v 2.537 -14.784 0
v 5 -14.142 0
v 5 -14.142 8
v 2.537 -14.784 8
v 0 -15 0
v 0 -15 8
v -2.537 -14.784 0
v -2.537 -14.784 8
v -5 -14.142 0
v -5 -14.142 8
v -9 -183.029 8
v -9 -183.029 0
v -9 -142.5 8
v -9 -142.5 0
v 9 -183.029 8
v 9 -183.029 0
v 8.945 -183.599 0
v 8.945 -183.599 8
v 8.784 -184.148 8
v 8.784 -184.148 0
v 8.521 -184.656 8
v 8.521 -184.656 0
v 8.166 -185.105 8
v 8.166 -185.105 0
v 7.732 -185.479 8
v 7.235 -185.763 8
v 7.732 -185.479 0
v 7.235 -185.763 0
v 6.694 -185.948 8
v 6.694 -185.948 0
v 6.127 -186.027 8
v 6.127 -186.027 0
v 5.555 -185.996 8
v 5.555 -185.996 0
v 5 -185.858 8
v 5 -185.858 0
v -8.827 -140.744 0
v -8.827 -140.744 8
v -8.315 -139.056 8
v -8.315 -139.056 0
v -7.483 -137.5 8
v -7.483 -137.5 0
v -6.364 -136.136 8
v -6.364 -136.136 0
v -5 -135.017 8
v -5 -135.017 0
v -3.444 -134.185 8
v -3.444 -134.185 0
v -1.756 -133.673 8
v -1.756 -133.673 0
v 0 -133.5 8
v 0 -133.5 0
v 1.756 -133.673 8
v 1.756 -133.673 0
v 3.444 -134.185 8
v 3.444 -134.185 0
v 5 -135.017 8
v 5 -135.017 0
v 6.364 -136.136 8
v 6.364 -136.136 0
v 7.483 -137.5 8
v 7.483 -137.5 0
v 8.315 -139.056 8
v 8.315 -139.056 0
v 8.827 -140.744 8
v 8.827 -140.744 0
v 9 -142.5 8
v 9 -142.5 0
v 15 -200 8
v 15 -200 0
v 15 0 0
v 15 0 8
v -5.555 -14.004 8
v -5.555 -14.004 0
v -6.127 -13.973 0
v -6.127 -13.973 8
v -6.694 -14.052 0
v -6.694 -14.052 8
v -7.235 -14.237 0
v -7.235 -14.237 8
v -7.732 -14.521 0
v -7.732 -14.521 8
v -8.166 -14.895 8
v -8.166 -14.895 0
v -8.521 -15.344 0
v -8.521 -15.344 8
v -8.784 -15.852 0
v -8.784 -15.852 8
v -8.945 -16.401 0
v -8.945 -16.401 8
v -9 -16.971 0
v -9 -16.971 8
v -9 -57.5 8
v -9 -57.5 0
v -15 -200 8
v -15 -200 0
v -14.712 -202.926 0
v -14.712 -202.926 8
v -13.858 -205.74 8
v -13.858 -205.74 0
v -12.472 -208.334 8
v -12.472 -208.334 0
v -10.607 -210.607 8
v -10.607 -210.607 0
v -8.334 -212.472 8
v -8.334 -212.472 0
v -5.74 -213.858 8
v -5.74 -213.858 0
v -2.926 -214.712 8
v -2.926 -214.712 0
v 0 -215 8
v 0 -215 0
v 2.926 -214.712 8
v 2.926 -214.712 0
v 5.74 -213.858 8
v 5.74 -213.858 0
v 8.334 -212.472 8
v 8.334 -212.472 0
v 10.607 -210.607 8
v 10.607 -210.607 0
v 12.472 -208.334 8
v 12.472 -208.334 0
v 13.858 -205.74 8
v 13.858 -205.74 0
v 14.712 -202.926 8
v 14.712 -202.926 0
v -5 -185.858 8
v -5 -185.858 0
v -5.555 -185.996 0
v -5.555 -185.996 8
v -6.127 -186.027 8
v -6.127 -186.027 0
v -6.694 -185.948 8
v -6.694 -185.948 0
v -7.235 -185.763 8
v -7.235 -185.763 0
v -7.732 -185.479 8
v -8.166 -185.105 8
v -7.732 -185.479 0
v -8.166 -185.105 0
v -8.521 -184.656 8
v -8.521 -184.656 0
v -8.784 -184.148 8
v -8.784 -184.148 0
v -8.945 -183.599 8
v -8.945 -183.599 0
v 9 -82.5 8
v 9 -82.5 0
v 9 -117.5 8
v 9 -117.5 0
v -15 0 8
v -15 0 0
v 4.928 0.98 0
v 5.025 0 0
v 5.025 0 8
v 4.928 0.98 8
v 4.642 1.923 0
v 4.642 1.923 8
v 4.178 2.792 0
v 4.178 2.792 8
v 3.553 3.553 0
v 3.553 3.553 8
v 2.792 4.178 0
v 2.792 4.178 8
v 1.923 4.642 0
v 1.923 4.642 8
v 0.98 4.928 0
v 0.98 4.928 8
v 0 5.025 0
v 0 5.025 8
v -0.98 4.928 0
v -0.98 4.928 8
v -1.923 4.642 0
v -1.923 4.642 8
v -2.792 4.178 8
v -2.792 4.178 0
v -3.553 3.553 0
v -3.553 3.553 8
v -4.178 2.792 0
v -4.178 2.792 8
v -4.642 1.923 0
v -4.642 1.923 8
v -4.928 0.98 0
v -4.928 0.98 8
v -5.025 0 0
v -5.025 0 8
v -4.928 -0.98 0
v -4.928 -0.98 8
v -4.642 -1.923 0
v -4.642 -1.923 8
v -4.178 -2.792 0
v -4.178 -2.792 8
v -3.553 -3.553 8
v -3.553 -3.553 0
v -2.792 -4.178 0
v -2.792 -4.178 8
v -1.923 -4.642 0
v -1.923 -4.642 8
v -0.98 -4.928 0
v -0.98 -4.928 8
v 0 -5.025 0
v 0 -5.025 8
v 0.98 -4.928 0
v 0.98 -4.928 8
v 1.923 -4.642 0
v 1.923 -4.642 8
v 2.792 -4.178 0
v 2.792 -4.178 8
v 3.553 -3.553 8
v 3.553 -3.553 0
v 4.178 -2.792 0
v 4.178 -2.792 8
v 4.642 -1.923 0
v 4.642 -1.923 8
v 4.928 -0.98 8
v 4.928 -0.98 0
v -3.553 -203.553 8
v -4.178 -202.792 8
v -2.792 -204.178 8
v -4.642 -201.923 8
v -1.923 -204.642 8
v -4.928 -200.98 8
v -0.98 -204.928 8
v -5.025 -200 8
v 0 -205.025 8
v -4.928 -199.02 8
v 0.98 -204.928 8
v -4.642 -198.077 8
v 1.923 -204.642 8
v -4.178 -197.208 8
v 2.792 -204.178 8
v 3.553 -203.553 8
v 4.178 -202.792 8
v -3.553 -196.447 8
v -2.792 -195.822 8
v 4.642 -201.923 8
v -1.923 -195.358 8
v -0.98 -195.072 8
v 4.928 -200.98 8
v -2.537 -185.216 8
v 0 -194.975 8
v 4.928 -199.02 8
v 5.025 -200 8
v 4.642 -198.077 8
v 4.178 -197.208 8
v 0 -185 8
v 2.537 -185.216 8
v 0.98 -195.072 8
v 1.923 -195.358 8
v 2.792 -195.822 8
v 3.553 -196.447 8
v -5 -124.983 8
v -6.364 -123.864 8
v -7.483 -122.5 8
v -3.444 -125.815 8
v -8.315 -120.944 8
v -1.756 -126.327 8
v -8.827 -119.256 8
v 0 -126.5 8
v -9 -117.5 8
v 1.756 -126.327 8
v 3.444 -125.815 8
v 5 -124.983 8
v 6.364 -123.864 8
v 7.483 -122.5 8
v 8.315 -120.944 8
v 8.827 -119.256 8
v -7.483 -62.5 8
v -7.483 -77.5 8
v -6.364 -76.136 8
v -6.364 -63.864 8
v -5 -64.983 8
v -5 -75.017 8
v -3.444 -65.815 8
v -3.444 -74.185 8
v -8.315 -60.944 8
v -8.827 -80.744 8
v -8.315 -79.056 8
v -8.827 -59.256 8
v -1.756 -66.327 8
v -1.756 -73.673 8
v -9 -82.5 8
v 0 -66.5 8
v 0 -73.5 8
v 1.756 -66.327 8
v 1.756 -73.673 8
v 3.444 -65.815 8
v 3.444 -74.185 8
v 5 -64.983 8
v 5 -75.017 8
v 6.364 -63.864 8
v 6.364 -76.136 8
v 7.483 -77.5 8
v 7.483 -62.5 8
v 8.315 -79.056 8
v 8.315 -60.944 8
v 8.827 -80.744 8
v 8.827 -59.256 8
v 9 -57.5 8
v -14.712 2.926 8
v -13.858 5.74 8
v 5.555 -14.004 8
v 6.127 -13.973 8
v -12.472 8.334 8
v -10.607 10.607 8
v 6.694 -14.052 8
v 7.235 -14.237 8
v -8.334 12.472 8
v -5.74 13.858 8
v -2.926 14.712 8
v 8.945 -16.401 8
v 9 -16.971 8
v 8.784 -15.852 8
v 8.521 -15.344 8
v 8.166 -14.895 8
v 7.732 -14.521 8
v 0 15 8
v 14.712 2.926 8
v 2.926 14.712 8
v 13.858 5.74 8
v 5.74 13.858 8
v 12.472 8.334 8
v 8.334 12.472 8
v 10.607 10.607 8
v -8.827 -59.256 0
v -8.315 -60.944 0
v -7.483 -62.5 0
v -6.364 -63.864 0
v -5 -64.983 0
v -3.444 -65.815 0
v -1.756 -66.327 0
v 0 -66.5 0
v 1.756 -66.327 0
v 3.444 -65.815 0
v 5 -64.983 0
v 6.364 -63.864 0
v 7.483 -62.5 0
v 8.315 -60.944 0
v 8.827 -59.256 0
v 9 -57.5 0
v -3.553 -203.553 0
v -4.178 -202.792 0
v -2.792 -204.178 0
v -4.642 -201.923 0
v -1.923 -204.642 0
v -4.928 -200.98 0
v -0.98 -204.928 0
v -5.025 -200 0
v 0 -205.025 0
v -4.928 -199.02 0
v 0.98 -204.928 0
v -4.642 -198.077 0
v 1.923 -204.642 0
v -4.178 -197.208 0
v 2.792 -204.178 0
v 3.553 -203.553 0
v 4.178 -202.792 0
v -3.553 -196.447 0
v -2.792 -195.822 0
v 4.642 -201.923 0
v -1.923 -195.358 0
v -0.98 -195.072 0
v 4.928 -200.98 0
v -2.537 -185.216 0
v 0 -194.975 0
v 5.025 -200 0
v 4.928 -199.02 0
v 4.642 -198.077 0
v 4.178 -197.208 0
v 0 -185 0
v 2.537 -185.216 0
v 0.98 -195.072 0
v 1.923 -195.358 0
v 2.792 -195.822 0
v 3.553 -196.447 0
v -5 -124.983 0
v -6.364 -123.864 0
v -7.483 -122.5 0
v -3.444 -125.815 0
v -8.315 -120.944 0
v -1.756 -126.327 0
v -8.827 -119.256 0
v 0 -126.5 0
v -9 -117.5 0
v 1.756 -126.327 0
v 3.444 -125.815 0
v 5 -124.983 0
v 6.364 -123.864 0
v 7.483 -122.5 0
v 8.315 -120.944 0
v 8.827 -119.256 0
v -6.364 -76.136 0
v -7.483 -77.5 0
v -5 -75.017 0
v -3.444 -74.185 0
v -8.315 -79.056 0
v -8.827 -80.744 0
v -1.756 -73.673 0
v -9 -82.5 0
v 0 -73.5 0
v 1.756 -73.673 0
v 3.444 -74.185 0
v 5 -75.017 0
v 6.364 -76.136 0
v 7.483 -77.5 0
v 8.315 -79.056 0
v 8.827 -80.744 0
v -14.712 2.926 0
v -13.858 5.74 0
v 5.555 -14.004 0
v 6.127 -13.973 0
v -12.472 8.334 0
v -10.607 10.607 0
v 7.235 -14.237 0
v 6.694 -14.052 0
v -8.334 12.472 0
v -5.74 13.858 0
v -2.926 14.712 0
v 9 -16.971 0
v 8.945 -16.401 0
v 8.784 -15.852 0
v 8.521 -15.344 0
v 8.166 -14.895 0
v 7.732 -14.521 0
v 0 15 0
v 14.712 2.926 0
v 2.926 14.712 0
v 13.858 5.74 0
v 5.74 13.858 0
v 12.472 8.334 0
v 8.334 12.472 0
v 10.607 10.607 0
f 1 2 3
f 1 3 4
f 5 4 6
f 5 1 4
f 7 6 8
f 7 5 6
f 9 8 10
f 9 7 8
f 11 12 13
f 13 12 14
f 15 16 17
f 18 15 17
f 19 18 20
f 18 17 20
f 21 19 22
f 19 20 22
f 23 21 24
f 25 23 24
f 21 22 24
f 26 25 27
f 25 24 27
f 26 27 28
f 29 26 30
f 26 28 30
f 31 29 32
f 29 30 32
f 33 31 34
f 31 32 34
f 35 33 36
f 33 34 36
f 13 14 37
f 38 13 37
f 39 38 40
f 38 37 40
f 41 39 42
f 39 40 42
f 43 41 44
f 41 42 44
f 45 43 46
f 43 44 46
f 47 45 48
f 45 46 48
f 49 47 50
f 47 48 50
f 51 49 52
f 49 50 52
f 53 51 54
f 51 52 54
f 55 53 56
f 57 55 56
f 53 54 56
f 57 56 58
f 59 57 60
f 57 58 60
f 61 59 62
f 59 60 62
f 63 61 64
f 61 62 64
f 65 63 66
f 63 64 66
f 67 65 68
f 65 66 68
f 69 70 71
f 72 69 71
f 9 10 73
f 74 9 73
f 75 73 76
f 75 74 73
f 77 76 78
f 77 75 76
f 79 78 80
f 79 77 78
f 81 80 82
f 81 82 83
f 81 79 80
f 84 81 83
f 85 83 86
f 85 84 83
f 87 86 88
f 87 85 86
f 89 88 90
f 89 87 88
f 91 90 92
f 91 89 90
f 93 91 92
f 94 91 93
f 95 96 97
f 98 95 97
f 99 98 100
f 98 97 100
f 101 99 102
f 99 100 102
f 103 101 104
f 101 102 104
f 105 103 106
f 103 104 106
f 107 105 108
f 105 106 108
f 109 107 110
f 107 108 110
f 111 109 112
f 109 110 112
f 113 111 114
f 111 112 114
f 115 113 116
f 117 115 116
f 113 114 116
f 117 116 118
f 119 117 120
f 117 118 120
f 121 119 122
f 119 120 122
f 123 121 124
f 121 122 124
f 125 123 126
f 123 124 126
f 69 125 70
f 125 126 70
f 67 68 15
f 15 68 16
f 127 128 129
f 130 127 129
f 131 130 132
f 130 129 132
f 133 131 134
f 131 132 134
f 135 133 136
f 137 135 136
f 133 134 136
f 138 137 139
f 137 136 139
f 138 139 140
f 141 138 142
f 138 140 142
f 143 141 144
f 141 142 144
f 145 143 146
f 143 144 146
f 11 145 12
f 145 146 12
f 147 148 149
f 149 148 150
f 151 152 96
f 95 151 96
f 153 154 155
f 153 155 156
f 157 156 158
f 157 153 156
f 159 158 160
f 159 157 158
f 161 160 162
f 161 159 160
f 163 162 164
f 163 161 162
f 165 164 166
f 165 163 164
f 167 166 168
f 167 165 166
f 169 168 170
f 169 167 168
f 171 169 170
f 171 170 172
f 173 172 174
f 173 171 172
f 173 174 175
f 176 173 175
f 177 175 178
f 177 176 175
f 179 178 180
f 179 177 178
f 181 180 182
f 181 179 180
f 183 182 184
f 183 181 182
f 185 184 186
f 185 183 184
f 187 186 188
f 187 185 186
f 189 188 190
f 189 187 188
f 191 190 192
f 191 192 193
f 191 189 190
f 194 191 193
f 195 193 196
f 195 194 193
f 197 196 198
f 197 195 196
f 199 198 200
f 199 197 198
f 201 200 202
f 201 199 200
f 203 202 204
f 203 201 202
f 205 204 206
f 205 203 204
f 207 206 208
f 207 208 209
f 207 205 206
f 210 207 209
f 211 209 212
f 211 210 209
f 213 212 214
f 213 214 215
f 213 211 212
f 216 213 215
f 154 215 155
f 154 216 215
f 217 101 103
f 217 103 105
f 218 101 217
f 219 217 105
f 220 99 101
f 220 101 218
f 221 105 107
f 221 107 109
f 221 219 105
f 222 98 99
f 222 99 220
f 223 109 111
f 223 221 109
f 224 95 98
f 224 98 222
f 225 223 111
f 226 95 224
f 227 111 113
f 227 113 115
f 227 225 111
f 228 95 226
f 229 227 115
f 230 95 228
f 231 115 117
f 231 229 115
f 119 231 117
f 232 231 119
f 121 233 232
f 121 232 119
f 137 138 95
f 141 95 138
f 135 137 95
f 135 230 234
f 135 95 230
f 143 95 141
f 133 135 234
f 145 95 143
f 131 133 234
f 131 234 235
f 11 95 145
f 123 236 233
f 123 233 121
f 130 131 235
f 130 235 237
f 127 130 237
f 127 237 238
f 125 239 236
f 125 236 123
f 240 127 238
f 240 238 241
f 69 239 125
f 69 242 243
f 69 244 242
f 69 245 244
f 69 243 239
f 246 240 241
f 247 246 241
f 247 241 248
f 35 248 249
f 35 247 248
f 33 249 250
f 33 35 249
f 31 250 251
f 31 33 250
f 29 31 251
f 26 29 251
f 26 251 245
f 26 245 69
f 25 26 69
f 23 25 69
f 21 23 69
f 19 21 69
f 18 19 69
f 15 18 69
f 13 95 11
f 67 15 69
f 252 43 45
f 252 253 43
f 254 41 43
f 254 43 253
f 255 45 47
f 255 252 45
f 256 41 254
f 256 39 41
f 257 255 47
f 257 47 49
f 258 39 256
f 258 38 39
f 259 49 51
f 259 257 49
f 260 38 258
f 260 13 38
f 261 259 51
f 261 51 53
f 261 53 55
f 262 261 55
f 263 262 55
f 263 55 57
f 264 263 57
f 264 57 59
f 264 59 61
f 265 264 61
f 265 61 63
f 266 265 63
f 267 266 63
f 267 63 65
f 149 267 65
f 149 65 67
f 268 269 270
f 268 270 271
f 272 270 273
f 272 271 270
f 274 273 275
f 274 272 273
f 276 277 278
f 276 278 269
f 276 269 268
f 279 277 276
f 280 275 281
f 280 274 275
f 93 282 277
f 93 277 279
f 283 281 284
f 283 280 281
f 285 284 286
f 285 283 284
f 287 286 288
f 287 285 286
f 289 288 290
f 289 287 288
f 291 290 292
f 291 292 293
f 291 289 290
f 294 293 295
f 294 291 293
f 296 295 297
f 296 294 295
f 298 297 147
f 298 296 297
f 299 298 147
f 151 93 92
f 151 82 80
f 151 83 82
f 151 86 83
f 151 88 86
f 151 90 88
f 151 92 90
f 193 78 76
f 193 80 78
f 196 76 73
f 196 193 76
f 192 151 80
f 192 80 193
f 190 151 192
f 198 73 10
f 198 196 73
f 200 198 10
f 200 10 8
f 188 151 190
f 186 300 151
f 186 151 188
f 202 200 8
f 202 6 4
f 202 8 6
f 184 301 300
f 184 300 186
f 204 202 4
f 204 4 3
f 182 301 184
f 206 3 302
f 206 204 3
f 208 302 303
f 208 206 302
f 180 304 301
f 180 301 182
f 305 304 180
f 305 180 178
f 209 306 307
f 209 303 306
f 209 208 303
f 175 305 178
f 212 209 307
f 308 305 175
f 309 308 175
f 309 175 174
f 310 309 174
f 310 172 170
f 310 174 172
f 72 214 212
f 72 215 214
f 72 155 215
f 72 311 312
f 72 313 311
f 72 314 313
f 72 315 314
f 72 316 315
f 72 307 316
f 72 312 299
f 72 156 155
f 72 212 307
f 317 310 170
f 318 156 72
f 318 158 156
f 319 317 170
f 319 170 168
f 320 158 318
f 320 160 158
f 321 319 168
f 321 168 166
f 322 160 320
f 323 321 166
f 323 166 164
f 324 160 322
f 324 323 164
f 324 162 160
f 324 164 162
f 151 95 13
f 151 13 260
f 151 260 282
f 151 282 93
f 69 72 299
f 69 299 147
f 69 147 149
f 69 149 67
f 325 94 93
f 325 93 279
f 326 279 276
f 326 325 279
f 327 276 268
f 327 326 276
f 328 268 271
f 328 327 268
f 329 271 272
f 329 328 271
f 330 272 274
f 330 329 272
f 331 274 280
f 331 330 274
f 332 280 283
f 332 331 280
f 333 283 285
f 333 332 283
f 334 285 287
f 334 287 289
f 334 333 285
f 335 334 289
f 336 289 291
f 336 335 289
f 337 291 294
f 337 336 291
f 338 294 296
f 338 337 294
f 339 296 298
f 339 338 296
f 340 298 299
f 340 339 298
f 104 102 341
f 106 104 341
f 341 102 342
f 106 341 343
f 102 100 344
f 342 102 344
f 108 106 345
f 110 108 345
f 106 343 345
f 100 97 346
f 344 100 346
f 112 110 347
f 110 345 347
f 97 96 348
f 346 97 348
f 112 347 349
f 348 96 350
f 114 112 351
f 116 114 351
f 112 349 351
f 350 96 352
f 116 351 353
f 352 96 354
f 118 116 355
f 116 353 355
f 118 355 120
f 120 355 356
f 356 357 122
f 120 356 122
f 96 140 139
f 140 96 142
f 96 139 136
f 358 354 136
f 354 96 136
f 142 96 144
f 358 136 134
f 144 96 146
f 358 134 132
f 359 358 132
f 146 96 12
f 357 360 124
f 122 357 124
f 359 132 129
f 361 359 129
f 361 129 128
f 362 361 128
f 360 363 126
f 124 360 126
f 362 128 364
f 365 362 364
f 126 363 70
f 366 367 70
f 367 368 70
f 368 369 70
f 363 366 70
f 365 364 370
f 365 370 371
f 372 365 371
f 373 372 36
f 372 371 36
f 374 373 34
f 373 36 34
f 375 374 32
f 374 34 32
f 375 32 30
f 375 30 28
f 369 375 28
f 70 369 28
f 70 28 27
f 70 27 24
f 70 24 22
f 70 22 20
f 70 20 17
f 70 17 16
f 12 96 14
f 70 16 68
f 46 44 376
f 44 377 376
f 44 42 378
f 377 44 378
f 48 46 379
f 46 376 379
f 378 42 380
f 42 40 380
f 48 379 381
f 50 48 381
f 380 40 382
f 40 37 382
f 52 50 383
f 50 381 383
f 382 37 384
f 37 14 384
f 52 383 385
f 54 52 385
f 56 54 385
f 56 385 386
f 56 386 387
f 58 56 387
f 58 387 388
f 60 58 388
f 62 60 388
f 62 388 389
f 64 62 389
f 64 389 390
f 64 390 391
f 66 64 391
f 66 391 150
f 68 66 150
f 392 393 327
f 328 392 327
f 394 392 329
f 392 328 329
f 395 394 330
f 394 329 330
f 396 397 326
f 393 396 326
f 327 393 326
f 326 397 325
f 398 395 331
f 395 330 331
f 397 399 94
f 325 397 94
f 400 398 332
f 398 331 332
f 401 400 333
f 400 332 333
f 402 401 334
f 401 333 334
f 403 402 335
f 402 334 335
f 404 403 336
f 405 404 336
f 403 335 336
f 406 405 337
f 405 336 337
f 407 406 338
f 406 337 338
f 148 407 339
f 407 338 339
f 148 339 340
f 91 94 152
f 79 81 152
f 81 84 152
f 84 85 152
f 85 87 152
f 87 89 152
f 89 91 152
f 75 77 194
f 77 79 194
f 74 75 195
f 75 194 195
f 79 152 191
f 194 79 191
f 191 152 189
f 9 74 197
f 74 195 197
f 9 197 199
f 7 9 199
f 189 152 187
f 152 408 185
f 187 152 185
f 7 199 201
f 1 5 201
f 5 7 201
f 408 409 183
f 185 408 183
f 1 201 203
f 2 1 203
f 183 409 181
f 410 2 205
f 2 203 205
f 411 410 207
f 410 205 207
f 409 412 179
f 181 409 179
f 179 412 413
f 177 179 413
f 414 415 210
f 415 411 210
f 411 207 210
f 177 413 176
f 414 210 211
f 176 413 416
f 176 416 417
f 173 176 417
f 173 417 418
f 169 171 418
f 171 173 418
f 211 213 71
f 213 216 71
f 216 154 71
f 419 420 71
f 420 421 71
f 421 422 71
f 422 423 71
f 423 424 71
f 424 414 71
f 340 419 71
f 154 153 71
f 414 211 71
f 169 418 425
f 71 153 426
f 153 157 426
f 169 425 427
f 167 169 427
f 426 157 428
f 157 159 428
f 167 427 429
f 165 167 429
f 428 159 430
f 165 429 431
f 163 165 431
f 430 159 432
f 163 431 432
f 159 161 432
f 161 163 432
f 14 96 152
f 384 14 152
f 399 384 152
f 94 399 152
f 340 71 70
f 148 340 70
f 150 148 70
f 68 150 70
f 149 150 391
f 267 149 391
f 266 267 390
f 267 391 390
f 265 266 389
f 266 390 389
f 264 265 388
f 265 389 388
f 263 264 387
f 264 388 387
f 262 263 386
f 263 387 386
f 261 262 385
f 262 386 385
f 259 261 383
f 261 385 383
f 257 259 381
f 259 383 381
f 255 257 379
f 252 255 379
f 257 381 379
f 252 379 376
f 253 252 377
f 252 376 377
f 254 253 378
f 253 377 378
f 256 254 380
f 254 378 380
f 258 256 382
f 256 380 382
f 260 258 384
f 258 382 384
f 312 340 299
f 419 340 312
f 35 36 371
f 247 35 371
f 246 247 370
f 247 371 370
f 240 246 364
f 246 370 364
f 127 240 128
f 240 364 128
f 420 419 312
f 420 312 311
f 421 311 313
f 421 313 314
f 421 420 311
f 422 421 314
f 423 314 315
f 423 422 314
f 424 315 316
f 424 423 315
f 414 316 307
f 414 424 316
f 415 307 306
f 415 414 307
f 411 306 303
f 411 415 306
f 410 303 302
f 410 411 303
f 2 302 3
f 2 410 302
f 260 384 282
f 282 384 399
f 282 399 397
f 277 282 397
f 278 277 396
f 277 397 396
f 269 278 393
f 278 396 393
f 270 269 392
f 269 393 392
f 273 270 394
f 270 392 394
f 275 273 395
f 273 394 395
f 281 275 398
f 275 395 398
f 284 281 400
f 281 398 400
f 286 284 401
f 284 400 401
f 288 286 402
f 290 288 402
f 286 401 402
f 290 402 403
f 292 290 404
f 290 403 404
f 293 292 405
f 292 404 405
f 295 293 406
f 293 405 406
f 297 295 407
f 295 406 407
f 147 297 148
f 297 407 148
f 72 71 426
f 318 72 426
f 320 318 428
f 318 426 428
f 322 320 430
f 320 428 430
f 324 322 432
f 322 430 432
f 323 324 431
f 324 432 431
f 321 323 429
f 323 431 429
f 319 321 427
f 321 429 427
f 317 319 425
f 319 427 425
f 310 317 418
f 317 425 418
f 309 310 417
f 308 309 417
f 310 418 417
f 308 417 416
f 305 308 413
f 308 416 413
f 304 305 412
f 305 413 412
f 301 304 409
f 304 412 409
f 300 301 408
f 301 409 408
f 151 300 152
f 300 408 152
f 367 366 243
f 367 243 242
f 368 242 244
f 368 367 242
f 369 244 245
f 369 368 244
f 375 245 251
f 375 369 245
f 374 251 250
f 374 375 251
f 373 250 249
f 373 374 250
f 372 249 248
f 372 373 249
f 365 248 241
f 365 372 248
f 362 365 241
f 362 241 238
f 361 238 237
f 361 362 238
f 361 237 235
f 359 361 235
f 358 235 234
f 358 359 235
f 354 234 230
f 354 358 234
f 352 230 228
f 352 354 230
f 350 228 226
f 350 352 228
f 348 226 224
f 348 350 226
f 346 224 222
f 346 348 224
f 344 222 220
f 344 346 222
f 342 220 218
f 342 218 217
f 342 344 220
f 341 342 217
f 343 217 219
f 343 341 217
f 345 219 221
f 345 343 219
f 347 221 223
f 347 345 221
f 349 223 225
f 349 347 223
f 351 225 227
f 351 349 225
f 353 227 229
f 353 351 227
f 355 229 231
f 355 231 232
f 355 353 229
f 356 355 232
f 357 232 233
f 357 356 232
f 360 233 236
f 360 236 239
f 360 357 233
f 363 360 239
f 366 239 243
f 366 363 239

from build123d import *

# Parameters (mm, degrees)
SKETCH_1_R      = 5.025
EXTRUDE_1_DEPTH = 8


with BuildPart() as part:
    # 草图1 → 凸台-拉伸1 (new body)
    with BuildSketch(Plane.XY):
        with BuildLine():
            Line((-15, 0), (-15, -200))
            ThreePointArc((-15, -200), (0, -215), (15, -200))
            Line((15, -200), (15, 0))
            ThreePointArc((15, 0), (0, 15), (-15, 0))
        make_face()
        Circle(SKETCH_1_R, mode=Mode.SUBTRACT)
        with Locations((0, -200)):
            Circle(SKETCH_1_R, mode=Mode.SUBTRACT)
        with BuildLine():
            Line((-9, -16.970562748), (-9, -57.5))
            ThreePointArc((-9, -57.5), (0, -66.5), (9, -57.5))
            Line((9, -57.5), (9, -16.970562748))
            ThreePointArc((9, -16.970562748), (7.732050808, -14.521073006), (5, -14.142135624))
            ThreePointArc((5, -14.142135624), (0, -15), (-5, -14.142135624))
            ThreePointArc((-5, -14.142135624), (-7.732050808, -14.521073006), (-9, -16.970562748))
        make_face(mode=Mode.SUBTRACT)
        with BuildLine():
            Line((9, -82.5), (9, -117.5))
            ThreePointArc((9, -117.5), (0, -126.5), (-9, -117.5))
            Line((-9, -117.5), (-9, -82.5))
            ThreePointArc((-9, -82.5), (0, -73.5), (9, -82.5))
        make_face(mode=Mode.SUBTRACT)
        with BuildLine():
            Line((-9, -183.029437252), (-9, -142.5))
            ThreePointArc((-9, -142.5), (0, -133.5), (9, -142.5))
            Line((9, -142.5), (9, -183.029437252))
            ThreePointArc((9, -183.029437252), (7.732050808, -185.478926994), (5, -185.857864376))
            ThreePointArc((5, -185.857864376), (0, -185), (-5, -185.857864376))
            ThreePointArc((-5, -185.857864376), (-7.732050808, -185.478926994), (-9, -183.029437252))
        make_face(mode=Mode.SUBTRACT)
    extrude(amount=EXTRUDE_1_DEPTH)


solid = part.part
